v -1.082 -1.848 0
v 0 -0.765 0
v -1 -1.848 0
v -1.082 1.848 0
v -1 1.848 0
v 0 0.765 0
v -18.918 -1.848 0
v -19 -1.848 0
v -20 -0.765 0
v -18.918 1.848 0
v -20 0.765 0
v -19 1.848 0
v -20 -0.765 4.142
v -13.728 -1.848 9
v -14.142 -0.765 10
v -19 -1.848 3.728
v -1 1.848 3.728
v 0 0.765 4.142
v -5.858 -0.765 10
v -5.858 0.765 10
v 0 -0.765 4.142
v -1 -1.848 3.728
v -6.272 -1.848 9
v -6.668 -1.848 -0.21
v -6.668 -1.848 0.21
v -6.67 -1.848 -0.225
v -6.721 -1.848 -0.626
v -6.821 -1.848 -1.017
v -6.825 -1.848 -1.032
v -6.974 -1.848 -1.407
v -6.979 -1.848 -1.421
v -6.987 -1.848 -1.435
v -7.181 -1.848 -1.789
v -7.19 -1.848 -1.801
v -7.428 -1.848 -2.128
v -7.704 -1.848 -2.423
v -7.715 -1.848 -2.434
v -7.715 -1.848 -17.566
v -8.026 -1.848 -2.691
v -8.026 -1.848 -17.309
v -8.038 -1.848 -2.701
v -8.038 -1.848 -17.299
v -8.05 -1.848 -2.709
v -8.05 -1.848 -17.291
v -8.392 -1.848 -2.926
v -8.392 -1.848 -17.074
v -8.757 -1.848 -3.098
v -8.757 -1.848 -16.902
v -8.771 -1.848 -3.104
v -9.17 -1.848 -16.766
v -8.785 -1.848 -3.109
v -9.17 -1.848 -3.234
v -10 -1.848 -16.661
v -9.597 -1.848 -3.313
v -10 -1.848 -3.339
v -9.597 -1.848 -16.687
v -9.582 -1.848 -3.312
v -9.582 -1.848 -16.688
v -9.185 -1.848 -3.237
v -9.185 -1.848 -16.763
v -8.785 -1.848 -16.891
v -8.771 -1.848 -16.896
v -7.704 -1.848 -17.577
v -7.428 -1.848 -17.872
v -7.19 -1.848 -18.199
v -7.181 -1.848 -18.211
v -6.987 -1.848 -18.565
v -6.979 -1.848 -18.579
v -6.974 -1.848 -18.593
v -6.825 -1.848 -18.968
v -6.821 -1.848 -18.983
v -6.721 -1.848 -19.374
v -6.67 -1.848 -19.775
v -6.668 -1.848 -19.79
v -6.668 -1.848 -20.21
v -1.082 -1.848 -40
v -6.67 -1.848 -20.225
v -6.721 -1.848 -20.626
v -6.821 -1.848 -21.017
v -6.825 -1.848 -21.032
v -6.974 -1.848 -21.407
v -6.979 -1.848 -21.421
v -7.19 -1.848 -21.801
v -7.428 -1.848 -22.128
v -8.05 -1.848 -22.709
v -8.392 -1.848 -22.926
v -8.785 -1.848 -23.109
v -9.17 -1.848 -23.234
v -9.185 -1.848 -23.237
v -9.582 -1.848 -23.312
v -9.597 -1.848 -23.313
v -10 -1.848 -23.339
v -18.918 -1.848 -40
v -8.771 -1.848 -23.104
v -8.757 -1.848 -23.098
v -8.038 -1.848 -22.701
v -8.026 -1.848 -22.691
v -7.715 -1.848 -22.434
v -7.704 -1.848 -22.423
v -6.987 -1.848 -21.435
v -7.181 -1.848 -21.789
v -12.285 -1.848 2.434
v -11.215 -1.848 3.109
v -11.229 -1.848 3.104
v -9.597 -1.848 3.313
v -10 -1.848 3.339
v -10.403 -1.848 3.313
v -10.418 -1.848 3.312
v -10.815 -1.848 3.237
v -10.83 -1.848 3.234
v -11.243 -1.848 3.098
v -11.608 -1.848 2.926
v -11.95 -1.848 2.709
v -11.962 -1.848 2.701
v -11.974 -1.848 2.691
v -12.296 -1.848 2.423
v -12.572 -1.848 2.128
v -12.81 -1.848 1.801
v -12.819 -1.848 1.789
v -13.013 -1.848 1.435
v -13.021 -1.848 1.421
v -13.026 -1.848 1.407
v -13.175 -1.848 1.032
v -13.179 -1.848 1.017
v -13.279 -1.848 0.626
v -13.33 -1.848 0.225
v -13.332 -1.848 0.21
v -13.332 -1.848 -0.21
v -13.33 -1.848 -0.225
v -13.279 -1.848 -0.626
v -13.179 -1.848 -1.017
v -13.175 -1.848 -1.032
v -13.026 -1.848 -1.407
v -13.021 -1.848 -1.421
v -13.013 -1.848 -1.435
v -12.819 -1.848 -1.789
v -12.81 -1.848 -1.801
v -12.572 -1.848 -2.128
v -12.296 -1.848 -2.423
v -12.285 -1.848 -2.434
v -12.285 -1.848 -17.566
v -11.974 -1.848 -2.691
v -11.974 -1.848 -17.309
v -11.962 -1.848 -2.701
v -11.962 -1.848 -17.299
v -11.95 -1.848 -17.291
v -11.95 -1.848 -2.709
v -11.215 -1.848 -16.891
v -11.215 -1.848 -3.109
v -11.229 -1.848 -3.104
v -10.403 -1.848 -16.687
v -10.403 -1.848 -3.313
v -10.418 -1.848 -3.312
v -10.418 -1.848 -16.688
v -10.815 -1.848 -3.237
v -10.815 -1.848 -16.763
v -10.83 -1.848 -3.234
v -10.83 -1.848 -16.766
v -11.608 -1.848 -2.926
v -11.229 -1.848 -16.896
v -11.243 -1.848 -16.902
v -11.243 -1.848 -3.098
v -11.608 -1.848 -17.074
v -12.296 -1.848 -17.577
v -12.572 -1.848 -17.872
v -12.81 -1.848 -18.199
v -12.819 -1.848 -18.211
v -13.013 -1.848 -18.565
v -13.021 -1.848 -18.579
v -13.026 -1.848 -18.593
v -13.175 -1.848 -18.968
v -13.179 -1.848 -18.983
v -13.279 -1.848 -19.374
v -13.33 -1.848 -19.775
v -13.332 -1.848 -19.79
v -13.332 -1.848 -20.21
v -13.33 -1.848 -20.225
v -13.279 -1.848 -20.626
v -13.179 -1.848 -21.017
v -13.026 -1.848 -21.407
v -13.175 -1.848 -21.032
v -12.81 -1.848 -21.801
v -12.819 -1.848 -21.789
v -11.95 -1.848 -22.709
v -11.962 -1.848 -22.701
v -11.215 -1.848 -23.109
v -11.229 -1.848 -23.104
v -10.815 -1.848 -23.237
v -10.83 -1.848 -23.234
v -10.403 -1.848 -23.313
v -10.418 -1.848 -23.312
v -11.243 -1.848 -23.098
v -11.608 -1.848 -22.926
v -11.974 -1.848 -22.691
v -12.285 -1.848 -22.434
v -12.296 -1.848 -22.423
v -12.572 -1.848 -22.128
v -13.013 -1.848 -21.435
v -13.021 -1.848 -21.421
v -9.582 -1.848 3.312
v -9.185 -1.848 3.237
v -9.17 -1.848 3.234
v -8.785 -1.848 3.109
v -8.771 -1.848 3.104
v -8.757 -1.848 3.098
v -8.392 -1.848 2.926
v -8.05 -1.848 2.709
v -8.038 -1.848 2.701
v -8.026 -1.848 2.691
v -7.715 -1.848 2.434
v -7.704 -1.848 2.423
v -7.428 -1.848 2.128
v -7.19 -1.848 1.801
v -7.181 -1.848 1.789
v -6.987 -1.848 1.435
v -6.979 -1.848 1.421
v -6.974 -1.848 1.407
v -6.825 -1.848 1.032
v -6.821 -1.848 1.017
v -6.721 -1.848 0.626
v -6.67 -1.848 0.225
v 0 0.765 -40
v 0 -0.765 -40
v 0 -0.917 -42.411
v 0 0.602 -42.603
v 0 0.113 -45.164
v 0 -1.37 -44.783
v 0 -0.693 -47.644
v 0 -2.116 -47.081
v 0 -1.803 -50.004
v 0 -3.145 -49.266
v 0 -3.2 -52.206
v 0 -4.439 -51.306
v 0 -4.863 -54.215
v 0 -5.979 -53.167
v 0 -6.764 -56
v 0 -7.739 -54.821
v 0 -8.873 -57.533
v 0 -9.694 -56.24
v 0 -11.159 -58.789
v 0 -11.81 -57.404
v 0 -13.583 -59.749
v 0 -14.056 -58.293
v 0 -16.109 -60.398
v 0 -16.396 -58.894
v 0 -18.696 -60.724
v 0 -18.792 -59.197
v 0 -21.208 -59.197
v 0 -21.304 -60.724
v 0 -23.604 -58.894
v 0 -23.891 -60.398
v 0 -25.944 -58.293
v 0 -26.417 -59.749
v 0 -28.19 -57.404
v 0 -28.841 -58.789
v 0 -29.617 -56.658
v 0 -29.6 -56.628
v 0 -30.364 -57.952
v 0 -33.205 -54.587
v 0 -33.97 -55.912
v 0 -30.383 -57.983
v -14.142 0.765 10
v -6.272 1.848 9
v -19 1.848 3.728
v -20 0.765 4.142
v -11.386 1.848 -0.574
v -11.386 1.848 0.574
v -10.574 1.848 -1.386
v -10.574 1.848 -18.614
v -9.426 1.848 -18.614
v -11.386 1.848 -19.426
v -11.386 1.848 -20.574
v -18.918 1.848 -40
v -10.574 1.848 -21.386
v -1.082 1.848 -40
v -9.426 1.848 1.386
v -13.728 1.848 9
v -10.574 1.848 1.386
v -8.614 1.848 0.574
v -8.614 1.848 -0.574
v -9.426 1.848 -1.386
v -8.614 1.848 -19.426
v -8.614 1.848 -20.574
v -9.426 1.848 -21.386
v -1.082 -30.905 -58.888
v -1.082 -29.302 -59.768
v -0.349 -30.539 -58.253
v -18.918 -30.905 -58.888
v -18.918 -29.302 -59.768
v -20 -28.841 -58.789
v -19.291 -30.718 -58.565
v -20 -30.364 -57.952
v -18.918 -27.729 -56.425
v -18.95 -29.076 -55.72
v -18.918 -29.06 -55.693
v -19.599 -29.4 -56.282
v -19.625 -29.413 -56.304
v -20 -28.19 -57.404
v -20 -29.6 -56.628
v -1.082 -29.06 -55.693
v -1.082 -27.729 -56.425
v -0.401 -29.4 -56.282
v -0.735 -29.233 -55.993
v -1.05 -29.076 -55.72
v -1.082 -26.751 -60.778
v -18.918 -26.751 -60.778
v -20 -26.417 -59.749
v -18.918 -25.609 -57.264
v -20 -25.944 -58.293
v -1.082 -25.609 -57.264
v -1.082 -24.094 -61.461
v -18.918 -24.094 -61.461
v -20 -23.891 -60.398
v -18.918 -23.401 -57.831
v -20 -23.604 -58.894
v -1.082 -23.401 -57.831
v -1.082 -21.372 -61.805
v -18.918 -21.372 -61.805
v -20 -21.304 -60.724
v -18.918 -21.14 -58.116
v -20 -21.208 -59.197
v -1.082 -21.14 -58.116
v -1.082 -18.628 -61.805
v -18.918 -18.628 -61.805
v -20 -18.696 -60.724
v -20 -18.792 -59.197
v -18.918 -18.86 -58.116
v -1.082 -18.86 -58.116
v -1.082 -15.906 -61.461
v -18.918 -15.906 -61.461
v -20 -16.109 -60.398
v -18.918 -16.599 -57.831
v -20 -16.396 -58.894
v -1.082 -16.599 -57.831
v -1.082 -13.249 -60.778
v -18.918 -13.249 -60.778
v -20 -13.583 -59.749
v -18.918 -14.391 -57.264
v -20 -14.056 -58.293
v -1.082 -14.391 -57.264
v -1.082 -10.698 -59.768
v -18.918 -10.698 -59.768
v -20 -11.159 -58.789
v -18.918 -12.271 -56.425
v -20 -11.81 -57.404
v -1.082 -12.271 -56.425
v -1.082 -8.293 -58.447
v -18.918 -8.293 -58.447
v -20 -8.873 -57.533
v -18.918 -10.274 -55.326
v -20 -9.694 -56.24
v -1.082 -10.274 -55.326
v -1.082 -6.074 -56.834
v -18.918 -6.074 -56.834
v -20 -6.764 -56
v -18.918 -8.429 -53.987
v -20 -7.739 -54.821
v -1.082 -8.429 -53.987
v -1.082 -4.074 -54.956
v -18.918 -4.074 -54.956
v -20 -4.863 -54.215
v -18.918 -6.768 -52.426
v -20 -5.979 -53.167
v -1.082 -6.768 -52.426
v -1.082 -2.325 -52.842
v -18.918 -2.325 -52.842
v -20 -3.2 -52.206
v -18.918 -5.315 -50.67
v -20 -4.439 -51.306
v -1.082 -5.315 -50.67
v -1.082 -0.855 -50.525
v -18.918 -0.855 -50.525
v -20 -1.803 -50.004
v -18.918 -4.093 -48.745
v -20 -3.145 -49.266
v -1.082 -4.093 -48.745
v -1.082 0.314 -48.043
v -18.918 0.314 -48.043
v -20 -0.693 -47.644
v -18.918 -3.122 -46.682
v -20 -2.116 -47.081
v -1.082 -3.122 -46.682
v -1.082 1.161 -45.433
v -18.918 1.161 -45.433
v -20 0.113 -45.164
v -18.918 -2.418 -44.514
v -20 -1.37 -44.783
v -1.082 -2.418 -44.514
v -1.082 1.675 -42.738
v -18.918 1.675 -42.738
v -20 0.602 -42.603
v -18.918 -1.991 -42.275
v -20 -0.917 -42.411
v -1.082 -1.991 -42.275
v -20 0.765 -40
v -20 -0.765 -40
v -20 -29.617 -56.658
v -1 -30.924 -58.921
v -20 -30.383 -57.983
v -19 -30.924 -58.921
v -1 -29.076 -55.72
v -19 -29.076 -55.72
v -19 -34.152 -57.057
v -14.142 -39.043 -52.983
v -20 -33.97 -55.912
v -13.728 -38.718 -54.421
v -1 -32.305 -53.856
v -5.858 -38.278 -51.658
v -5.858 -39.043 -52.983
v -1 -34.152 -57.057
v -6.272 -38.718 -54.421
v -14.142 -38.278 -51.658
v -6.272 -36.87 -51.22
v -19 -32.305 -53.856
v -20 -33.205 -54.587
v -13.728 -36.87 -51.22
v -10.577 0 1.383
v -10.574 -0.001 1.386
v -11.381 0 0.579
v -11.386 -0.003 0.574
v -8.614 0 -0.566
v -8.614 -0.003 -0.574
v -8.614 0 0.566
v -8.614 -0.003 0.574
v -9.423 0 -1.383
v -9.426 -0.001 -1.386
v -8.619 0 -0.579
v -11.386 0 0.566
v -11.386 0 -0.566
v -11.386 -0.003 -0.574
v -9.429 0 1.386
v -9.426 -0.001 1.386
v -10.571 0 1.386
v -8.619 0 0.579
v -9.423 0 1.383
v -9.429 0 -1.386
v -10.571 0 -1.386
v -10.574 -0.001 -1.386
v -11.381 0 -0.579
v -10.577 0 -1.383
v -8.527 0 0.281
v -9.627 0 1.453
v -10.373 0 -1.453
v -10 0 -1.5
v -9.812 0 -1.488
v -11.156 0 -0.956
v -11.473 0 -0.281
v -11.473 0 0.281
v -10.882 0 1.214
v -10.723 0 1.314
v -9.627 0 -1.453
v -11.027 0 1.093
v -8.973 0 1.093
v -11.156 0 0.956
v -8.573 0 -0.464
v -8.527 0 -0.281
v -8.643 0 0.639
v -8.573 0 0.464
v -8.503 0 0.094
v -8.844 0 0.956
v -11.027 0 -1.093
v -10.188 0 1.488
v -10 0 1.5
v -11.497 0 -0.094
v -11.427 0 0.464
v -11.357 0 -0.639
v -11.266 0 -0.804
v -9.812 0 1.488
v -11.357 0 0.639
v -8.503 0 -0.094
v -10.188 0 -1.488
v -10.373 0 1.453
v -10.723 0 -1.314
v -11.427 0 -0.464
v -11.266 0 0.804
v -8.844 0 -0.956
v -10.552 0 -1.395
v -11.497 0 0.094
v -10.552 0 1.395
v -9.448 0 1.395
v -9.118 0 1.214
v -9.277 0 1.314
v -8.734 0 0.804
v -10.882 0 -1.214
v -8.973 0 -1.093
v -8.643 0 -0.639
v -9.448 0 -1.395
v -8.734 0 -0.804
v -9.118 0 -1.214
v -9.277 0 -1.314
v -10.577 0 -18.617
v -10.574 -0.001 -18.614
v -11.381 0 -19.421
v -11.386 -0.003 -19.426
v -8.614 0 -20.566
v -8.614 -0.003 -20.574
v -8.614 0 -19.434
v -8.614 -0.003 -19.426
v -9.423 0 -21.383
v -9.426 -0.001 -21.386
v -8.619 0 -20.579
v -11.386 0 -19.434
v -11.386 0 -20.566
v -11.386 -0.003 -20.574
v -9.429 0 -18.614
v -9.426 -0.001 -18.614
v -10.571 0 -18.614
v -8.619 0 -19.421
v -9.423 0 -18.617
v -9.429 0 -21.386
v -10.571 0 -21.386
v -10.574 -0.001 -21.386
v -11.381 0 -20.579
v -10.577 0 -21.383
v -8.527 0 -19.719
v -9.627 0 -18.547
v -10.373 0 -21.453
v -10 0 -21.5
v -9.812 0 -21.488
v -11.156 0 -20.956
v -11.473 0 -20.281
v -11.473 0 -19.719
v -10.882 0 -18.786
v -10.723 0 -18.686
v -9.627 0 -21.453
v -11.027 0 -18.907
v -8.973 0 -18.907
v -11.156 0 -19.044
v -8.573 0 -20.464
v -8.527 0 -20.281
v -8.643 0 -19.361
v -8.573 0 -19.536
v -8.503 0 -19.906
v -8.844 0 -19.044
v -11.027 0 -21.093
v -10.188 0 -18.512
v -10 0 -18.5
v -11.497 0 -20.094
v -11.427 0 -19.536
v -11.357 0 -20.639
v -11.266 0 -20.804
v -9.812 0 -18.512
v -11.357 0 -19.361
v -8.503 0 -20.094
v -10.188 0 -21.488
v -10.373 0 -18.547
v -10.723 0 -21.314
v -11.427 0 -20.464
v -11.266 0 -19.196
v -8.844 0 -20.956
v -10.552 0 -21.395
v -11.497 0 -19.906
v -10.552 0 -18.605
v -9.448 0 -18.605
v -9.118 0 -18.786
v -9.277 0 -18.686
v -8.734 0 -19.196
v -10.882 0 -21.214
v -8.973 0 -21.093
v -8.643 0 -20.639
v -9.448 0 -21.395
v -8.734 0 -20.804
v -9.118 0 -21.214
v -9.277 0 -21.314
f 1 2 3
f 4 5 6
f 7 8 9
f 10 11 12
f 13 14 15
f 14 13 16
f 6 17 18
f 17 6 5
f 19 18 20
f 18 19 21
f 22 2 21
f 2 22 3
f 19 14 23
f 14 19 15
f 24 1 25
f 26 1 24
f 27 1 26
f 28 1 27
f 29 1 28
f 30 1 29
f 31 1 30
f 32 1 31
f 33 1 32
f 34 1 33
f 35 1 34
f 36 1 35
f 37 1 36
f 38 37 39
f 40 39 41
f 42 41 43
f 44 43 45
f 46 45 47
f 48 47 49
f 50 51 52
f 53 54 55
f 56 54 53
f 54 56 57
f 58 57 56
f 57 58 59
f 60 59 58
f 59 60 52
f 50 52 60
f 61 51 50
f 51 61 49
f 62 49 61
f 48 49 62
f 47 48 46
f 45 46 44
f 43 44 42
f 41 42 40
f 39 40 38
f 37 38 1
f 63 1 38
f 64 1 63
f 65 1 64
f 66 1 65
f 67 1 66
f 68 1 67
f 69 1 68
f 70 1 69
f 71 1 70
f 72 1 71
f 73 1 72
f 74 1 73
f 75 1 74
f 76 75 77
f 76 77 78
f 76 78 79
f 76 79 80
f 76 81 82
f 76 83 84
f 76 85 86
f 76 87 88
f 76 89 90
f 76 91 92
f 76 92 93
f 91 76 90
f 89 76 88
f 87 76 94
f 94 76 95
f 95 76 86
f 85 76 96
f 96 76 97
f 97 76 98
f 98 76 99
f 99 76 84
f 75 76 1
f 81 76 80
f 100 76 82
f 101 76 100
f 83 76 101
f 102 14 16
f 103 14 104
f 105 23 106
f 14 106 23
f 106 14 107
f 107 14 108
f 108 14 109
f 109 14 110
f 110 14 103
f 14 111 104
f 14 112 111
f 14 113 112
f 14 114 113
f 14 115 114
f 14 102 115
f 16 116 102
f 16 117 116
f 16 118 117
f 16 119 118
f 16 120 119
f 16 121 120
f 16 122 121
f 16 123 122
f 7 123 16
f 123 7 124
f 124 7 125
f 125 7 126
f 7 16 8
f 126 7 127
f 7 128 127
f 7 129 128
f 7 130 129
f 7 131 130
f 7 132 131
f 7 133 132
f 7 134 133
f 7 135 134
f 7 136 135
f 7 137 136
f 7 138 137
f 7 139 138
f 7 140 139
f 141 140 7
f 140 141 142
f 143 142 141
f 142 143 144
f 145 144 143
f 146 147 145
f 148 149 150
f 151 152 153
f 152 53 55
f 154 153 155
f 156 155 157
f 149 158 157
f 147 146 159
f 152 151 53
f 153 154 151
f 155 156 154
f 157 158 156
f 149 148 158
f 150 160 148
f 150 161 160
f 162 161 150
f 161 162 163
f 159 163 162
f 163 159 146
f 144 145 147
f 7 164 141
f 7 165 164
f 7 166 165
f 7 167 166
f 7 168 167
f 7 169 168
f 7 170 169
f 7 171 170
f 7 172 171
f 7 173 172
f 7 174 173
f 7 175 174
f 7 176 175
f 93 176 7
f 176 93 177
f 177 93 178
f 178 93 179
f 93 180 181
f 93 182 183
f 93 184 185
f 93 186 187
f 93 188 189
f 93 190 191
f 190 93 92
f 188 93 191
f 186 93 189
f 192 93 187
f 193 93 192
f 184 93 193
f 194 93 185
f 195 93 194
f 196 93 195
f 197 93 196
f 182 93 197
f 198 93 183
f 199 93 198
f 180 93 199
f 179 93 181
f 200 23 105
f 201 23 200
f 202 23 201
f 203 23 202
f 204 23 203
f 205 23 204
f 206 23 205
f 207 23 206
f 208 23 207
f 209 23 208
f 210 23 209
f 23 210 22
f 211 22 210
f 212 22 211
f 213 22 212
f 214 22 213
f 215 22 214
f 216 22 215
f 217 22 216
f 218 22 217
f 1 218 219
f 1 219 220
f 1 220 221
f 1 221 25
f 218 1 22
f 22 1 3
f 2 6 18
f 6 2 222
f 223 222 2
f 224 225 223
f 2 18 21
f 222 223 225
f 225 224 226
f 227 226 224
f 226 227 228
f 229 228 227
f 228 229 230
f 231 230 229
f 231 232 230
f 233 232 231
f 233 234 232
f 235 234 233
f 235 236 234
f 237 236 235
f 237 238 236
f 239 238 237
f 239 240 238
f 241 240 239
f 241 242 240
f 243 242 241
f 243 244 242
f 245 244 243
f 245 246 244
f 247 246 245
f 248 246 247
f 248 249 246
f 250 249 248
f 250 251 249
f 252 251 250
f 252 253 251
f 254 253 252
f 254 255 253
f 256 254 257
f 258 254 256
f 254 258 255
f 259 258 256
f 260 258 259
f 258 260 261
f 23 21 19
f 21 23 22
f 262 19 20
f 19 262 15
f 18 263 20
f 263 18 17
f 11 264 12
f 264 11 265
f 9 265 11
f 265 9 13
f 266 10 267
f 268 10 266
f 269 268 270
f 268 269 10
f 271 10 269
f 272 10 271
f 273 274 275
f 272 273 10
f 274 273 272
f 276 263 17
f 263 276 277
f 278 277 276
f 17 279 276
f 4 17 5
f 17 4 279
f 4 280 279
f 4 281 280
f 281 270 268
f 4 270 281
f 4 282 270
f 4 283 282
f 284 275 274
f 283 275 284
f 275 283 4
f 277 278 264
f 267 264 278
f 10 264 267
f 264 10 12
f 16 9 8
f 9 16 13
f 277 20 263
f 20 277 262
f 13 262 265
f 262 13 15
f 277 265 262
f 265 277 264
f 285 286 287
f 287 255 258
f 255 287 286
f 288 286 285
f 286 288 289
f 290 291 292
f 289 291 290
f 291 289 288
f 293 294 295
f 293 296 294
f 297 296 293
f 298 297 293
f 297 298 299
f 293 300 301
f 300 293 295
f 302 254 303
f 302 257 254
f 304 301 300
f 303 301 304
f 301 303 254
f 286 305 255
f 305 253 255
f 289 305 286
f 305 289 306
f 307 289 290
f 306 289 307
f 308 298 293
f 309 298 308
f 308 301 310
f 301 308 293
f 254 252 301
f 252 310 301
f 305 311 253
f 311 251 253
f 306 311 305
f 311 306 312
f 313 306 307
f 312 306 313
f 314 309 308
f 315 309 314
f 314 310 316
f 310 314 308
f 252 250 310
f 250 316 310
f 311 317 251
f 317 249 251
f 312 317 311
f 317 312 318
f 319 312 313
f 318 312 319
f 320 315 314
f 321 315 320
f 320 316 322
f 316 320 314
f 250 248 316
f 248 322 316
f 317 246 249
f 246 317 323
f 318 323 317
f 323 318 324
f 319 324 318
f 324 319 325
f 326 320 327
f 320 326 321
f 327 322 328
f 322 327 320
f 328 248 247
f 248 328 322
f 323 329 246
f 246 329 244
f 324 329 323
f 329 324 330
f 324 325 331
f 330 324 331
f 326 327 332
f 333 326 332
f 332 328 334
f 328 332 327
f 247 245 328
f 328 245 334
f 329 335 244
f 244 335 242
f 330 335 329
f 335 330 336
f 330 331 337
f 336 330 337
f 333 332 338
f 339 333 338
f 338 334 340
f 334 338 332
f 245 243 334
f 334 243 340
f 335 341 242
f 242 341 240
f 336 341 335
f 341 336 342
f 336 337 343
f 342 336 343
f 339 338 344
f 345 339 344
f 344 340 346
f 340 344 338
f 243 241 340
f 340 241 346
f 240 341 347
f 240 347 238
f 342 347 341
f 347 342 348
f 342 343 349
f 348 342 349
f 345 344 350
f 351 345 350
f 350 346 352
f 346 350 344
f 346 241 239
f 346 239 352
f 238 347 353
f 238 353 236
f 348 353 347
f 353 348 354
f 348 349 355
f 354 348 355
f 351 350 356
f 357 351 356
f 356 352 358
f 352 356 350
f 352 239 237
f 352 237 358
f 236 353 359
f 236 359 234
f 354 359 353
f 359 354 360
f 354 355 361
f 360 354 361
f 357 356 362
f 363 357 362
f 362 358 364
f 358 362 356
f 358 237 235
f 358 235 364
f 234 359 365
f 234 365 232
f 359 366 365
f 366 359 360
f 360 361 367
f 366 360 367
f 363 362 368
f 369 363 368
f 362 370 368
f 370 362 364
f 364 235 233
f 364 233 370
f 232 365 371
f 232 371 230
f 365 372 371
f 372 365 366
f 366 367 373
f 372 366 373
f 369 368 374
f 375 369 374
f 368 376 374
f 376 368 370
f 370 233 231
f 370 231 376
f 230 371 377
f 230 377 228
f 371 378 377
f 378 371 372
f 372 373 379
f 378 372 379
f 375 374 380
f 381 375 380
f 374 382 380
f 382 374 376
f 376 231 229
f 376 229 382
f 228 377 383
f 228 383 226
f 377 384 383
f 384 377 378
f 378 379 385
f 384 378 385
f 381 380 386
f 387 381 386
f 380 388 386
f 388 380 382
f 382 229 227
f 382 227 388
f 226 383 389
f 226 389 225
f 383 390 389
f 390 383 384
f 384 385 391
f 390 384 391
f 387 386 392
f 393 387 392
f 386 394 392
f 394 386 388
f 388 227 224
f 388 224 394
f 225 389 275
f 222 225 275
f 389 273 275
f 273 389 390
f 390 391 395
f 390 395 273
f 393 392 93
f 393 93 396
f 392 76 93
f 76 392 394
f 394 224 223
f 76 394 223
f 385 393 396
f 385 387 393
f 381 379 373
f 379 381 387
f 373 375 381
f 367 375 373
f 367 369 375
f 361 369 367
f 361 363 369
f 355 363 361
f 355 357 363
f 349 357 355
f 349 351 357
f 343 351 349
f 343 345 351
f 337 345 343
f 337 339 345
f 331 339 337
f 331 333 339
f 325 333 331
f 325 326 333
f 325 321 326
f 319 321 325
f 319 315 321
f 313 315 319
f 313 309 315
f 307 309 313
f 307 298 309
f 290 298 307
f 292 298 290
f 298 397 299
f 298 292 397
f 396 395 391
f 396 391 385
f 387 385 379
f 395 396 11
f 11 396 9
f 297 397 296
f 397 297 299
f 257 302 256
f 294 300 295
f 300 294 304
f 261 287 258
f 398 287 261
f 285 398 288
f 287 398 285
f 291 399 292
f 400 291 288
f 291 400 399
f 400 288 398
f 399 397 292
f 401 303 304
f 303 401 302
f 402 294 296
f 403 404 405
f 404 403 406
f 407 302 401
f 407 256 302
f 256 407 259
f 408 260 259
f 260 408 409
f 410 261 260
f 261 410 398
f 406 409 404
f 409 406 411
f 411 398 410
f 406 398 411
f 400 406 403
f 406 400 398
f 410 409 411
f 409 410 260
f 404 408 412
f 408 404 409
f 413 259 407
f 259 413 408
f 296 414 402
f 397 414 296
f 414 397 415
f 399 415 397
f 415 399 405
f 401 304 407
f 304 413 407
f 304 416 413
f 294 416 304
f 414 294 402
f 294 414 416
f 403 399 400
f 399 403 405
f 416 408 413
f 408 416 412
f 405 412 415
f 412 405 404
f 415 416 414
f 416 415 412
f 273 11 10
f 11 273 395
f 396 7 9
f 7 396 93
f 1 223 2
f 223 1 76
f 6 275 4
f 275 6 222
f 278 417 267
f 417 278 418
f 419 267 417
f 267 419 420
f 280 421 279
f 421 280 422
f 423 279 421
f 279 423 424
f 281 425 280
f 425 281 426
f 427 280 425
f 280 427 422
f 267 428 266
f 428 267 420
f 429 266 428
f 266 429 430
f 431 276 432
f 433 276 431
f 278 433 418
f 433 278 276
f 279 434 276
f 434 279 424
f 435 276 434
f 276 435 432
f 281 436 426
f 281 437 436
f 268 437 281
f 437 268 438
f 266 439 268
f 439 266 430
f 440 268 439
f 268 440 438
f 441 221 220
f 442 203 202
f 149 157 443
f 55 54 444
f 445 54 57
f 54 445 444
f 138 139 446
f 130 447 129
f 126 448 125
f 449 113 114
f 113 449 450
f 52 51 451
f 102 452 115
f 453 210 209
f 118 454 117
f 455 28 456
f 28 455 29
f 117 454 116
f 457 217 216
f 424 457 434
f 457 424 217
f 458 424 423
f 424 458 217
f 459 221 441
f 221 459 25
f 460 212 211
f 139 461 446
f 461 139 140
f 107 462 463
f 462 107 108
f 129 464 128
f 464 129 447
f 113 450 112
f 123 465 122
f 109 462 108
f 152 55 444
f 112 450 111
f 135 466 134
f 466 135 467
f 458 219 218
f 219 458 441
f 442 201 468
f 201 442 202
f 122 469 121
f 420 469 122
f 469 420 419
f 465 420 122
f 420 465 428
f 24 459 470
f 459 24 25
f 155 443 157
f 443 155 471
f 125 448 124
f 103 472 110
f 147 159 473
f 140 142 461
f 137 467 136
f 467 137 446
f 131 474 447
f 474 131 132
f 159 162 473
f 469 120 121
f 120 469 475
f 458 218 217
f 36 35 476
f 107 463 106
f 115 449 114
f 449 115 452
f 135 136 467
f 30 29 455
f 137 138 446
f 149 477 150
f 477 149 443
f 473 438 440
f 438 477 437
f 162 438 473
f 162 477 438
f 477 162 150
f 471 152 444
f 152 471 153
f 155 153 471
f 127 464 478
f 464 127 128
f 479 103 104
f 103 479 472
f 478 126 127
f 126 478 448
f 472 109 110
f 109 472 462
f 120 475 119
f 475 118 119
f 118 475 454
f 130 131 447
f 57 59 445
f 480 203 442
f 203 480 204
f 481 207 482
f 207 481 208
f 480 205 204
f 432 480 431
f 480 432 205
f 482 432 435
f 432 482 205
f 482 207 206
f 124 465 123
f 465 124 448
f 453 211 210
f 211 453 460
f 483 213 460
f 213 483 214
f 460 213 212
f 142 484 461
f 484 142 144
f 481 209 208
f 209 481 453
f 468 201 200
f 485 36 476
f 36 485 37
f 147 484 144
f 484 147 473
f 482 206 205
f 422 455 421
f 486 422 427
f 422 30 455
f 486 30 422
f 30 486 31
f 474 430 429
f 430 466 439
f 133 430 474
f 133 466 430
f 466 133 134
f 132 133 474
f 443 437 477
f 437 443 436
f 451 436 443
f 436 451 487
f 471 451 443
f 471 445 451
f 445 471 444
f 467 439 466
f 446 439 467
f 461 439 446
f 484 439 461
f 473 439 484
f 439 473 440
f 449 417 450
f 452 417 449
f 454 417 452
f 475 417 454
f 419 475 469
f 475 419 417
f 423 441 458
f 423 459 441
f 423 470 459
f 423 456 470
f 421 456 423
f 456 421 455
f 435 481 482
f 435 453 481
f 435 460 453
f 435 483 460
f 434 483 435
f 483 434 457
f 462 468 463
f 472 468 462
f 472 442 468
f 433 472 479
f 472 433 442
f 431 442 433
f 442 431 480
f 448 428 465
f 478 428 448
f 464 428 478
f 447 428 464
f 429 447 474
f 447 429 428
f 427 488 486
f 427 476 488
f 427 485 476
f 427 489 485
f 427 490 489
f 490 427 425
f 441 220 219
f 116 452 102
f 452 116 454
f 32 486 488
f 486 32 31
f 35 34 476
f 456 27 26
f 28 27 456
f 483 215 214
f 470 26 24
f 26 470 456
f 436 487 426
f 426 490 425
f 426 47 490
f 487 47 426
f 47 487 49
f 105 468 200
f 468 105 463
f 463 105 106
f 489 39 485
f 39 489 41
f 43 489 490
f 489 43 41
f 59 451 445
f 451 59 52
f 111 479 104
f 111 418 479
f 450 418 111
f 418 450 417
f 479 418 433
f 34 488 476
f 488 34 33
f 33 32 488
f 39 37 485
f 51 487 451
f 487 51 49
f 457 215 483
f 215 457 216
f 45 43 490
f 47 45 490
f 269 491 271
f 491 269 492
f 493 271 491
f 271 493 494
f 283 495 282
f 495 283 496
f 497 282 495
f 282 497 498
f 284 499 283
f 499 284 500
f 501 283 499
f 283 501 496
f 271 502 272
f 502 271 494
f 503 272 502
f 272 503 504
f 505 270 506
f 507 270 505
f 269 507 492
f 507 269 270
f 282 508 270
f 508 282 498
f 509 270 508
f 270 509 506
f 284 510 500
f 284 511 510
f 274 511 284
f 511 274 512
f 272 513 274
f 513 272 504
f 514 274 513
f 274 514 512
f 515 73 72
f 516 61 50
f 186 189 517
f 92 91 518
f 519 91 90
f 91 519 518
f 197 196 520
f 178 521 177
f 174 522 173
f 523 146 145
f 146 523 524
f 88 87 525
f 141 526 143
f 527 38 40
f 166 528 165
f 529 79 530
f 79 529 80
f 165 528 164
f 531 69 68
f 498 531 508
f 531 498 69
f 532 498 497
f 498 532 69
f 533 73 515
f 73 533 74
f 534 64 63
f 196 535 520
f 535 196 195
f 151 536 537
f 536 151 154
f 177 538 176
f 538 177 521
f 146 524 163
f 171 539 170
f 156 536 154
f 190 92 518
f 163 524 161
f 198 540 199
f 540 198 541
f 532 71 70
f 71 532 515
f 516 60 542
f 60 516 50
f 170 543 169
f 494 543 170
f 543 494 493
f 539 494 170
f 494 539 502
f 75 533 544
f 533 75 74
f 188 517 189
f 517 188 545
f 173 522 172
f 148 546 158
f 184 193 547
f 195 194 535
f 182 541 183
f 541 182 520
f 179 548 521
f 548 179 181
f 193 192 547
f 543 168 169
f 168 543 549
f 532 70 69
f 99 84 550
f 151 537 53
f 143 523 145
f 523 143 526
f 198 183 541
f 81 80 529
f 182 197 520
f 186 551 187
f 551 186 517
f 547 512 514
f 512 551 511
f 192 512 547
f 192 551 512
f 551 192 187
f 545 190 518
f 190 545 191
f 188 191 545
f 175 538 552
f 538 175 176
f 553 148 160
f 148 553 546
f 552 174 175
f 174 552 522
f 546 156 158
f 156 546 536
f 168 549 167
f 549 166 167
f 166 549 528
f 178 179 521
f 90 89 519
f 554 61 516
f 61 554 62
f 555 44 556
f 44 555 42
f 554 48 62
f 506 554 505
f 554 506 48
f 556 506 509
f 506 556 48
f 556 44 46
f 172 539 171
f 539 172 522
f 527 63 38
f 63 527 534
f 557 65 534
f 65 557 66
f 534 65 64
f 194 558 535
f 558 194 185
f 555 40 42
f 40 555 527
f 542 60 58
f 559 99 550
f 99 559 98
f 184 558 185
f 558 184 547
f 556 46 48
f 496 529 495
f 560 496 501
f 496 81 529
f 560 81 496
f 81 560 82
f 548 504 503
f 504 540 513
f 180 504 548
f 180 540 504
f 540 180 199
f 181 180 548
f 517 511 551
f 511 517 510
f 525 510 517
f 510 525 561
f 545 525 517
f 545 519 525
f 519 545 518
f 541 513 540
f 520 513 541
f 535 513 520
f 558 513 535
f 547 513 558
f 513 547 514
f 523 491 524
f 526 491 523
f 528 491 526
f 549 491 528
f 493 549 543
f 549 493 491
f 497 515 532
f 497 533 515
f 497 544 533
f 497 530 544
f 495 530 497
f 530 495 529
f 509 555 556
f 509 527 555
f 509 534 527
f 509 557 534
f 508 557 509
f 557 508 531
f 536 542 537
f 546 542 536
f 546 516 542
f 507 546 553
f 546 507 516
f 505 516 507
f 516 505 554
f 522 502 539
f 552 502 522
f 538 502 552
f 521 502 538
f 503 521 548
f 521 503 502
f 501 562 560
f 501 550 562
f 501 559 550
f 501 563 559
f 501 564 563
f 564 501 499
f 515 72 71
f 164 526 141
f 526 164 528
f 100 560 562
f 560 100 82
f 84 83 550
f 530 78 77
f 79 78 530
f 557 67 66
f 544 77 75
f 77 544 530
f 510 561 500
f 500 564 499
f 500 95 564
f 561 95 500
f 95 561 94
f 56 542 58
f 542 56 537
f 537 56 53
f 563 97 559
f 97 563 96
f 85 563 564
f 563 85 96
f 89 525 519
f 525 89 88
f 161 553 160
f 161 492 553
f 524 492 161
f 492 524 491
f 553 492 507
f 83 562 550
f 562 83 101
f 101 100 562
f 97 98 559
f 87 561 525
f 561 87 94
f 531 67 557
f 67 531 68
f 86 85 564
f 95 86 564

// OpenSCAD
// ************* Credits part *************

// Programmed by Fryns - March 2014

// Optimized for Customizer 

// Includes Pie Slice OpenSCAD Library by Chris Petersen, published on Thingiverse 27-Jun-2013 (thing:109467)	 

// ************* Declaration part *************

/* [Hanger] */
// Width of hanger in mm
width=20;
// Thickness of hanger in mm
thickness=4;
// Length of straigth part in mm
length=40;
// Diameter of circle producing hanger arc in mm
turn_diameter=40;
// Angle of arc
turn_angle=120; //[1:360]

/* [Geometry and finish] */
resolution=50; //[20:Draft,50:Medium,100:Fine, 200:very fine]
// Choose even numbers: 8 for 3D print optimized and higher e.g. 100 for fine
geometry=8; // Note that module "end" is only accurate for geometry = 4*integer

/* [Holes] */
// Hole size in mm
hole_diameter=3;
// Hole 1 position in mm
hole1=0;
// Hole 1 position in mm
hole2=20;
// Depth of countersink in mm
countersink_depth=2;

/* [Hidden] */
geo_width=width-thickness*cos(360/(geometry*2));

// ************* Executable part *************
rotate(a=[0,90,180])
difference(){
	assembly();
	translate([hole1,0,0])
		hole();
	translate([hole2,0,0])
		hole();
}

// ************* Module part *************

module assembly(){
	translate([0,0,0])
		rotate(a=[0,0,0])
			end();
	translate([0,0,0])
		rotate(a=[0,0,0])
			straight(length=length);
	translate([length,0,0])
		rotate(a=[0,0,0])
			turn(diameter=turn_diameter,angle=turn_angle);
	translate([length+turn_diameter/2*cos(turn_angle-90),turn_diameter/2+turn_diameter/2*sin(turn_angle-90),0])
		rotate(a=[0,0,turn_angle-180])	
			end();
}

module hole(){
	translate([0,0,width/2])
		rotate(a=[-90,0,0]){
			rotate(a=[0,0,90-(180-(360/geometry))/2])
				cylinder(h = thickness+0.01, r = hole_diameter/2, $fn=geometry, center = true);
			translate([0,0,thickness/2-countersink_depth])
				cylinder(h = countersink_depth+0.01, r1 = hole_diameter/2, r2 = (hole_diameter+2*countersink_depth)/2, $fn=resolution, center = false);
		}
}

module turn(diameter,angle){
	translate([0,diameter/2,0])
		rotate(a=[0,0,-90])
			intersection(){
				ring(diameter=diameter);
				translate([0,0,-(geo_width+thickness)])
					pie(radius=diameter/2+thickness, angle=angle, height=2*(geo_width+thickness), spin=0);
			}
}

module straight(length){
	translate([0,0,thickness*cos(360/(geometry*2))/2])
		rotate(a=[-180,-90,0])
			linear_extrude(height = length, center = false, convexity = 10, twist = 0)
				hull() {
   				translate([geo_width,0,0])
				rotate(a=90-(180-(360/geometry))/2)
    				circle(thickness/2,$fn=geometry);
				rotate(a=90-(180-(360/geometry))/2)
   				circle(thickness/2,$fn=geometry);
 				}
}

module ring(diameter){
	translate([0,0,thickness*cos(360/(geometry*2))/2])
		rotate_extrude(convexity = 10, $fn = resolution)
			translate([diameter/2, 0, 0])
				rotate(a=[0,0,90])
					hull() {
   					translate([geo_width,0,0])
						rotate(a=90-(180-(360/geometry))/2)
    						circle(thickness/2,$fn=geometry);
						rotate(a=90-(180-(360/geometry))/2)
   						circle(thickness/2,$fn=geometry);
 				}
}

module end() {
	translate([0,0,geo_width/2+thickness*cos(360/(geometry*2))/2])
		intersection(){
			translate([-2*(geo_width+thickness),-(geo_width+thickness),-(geo_width+thickness)])
				cube(2*(geo_width+thickness));
			rotate(a=[90,-90,0])
				rotate(a=90-(180-(360/geometry))/2)
					rotate_extrude(convexity = 10, $fn = geometry)
						hull() {
	   					translate([(geo_width/2+thickness*cos(360/(geometry*2))/2)/cos(360/(geometry*2))-thickness*cos(360/(geometry*2))/2,0,0])
							rotate(a=90-(180-(360/geometry))/2)
    							circle(thickness/2,$fn=geometry);
							translate([thickness*cos(360/(geometry*2))/2,0,0])
   							square(thickness*cos(360/(geometry*2)),center=true);
 						}
		}
}

// ****************************************************************************
// Borrowed code
// ****************************************************************************

/**
 * pie.scad
 *
 * Use this module to generate a pie- or pizza- slice shape, which is particularly useful
 * in combination with `difference()` and `intersection()` to render shapes that extend a
 * certain number of degrees around or within a circle.
 *
 * This openSCAD library is part of the [dotscad](https://github.com/dotscad/dotscad)
 * project.
 *
 * @copyright  Chris Petersen, 2013
 * @license    http://creativecommons.org/licenses/LGPL/2.1/
 * @license    http://creativecommons.org/licenses/by-sa/3.0/
 *
 * @see        http://www.thingiverse.com/thing:109467
 * @source     https://github.com/dotscad/dotscad/blob/master/pie.scad
 *
 * @param float radius Radius of the pie
 * @param float angle  Angle (size) of the pie to slice
 * @param float height Height (thickness) of the pie
 * @param float spin   Angle to spin the slice on the Z axis
 */
module pie(radius, angle, height, spin=0) {

    // Negative angles shift direction of rotation
    clockwise = (angle < 0) ? true : false;
    // Support angles < 0 and > 360
    normalized_angle = abs((angle % 360 != 0) ? angle % 360 : angle % 360 + 360);
    // Select rotation direction
    rotation = clockwise ? [0, 180 - normalized_angle] : [180, normalized_angle];
    // Render
    if (angle != 0) {
        rotate([0,0,spin]) linear_extrude(height=height)
            difference() {
                circle(radius);
                if (normalized_angle < 180) {
                    union() for(a = rotation)
                        rotate(a) translate([-radius, 0, 0]) square(radius * 2);
                }
                else if (normalized_angle != 360) {
                    intersection_for(a = rotation)
                        rotate(a) translate([-radius, 0, 0]) square(radius * 2);
                }
            }
    }

}
